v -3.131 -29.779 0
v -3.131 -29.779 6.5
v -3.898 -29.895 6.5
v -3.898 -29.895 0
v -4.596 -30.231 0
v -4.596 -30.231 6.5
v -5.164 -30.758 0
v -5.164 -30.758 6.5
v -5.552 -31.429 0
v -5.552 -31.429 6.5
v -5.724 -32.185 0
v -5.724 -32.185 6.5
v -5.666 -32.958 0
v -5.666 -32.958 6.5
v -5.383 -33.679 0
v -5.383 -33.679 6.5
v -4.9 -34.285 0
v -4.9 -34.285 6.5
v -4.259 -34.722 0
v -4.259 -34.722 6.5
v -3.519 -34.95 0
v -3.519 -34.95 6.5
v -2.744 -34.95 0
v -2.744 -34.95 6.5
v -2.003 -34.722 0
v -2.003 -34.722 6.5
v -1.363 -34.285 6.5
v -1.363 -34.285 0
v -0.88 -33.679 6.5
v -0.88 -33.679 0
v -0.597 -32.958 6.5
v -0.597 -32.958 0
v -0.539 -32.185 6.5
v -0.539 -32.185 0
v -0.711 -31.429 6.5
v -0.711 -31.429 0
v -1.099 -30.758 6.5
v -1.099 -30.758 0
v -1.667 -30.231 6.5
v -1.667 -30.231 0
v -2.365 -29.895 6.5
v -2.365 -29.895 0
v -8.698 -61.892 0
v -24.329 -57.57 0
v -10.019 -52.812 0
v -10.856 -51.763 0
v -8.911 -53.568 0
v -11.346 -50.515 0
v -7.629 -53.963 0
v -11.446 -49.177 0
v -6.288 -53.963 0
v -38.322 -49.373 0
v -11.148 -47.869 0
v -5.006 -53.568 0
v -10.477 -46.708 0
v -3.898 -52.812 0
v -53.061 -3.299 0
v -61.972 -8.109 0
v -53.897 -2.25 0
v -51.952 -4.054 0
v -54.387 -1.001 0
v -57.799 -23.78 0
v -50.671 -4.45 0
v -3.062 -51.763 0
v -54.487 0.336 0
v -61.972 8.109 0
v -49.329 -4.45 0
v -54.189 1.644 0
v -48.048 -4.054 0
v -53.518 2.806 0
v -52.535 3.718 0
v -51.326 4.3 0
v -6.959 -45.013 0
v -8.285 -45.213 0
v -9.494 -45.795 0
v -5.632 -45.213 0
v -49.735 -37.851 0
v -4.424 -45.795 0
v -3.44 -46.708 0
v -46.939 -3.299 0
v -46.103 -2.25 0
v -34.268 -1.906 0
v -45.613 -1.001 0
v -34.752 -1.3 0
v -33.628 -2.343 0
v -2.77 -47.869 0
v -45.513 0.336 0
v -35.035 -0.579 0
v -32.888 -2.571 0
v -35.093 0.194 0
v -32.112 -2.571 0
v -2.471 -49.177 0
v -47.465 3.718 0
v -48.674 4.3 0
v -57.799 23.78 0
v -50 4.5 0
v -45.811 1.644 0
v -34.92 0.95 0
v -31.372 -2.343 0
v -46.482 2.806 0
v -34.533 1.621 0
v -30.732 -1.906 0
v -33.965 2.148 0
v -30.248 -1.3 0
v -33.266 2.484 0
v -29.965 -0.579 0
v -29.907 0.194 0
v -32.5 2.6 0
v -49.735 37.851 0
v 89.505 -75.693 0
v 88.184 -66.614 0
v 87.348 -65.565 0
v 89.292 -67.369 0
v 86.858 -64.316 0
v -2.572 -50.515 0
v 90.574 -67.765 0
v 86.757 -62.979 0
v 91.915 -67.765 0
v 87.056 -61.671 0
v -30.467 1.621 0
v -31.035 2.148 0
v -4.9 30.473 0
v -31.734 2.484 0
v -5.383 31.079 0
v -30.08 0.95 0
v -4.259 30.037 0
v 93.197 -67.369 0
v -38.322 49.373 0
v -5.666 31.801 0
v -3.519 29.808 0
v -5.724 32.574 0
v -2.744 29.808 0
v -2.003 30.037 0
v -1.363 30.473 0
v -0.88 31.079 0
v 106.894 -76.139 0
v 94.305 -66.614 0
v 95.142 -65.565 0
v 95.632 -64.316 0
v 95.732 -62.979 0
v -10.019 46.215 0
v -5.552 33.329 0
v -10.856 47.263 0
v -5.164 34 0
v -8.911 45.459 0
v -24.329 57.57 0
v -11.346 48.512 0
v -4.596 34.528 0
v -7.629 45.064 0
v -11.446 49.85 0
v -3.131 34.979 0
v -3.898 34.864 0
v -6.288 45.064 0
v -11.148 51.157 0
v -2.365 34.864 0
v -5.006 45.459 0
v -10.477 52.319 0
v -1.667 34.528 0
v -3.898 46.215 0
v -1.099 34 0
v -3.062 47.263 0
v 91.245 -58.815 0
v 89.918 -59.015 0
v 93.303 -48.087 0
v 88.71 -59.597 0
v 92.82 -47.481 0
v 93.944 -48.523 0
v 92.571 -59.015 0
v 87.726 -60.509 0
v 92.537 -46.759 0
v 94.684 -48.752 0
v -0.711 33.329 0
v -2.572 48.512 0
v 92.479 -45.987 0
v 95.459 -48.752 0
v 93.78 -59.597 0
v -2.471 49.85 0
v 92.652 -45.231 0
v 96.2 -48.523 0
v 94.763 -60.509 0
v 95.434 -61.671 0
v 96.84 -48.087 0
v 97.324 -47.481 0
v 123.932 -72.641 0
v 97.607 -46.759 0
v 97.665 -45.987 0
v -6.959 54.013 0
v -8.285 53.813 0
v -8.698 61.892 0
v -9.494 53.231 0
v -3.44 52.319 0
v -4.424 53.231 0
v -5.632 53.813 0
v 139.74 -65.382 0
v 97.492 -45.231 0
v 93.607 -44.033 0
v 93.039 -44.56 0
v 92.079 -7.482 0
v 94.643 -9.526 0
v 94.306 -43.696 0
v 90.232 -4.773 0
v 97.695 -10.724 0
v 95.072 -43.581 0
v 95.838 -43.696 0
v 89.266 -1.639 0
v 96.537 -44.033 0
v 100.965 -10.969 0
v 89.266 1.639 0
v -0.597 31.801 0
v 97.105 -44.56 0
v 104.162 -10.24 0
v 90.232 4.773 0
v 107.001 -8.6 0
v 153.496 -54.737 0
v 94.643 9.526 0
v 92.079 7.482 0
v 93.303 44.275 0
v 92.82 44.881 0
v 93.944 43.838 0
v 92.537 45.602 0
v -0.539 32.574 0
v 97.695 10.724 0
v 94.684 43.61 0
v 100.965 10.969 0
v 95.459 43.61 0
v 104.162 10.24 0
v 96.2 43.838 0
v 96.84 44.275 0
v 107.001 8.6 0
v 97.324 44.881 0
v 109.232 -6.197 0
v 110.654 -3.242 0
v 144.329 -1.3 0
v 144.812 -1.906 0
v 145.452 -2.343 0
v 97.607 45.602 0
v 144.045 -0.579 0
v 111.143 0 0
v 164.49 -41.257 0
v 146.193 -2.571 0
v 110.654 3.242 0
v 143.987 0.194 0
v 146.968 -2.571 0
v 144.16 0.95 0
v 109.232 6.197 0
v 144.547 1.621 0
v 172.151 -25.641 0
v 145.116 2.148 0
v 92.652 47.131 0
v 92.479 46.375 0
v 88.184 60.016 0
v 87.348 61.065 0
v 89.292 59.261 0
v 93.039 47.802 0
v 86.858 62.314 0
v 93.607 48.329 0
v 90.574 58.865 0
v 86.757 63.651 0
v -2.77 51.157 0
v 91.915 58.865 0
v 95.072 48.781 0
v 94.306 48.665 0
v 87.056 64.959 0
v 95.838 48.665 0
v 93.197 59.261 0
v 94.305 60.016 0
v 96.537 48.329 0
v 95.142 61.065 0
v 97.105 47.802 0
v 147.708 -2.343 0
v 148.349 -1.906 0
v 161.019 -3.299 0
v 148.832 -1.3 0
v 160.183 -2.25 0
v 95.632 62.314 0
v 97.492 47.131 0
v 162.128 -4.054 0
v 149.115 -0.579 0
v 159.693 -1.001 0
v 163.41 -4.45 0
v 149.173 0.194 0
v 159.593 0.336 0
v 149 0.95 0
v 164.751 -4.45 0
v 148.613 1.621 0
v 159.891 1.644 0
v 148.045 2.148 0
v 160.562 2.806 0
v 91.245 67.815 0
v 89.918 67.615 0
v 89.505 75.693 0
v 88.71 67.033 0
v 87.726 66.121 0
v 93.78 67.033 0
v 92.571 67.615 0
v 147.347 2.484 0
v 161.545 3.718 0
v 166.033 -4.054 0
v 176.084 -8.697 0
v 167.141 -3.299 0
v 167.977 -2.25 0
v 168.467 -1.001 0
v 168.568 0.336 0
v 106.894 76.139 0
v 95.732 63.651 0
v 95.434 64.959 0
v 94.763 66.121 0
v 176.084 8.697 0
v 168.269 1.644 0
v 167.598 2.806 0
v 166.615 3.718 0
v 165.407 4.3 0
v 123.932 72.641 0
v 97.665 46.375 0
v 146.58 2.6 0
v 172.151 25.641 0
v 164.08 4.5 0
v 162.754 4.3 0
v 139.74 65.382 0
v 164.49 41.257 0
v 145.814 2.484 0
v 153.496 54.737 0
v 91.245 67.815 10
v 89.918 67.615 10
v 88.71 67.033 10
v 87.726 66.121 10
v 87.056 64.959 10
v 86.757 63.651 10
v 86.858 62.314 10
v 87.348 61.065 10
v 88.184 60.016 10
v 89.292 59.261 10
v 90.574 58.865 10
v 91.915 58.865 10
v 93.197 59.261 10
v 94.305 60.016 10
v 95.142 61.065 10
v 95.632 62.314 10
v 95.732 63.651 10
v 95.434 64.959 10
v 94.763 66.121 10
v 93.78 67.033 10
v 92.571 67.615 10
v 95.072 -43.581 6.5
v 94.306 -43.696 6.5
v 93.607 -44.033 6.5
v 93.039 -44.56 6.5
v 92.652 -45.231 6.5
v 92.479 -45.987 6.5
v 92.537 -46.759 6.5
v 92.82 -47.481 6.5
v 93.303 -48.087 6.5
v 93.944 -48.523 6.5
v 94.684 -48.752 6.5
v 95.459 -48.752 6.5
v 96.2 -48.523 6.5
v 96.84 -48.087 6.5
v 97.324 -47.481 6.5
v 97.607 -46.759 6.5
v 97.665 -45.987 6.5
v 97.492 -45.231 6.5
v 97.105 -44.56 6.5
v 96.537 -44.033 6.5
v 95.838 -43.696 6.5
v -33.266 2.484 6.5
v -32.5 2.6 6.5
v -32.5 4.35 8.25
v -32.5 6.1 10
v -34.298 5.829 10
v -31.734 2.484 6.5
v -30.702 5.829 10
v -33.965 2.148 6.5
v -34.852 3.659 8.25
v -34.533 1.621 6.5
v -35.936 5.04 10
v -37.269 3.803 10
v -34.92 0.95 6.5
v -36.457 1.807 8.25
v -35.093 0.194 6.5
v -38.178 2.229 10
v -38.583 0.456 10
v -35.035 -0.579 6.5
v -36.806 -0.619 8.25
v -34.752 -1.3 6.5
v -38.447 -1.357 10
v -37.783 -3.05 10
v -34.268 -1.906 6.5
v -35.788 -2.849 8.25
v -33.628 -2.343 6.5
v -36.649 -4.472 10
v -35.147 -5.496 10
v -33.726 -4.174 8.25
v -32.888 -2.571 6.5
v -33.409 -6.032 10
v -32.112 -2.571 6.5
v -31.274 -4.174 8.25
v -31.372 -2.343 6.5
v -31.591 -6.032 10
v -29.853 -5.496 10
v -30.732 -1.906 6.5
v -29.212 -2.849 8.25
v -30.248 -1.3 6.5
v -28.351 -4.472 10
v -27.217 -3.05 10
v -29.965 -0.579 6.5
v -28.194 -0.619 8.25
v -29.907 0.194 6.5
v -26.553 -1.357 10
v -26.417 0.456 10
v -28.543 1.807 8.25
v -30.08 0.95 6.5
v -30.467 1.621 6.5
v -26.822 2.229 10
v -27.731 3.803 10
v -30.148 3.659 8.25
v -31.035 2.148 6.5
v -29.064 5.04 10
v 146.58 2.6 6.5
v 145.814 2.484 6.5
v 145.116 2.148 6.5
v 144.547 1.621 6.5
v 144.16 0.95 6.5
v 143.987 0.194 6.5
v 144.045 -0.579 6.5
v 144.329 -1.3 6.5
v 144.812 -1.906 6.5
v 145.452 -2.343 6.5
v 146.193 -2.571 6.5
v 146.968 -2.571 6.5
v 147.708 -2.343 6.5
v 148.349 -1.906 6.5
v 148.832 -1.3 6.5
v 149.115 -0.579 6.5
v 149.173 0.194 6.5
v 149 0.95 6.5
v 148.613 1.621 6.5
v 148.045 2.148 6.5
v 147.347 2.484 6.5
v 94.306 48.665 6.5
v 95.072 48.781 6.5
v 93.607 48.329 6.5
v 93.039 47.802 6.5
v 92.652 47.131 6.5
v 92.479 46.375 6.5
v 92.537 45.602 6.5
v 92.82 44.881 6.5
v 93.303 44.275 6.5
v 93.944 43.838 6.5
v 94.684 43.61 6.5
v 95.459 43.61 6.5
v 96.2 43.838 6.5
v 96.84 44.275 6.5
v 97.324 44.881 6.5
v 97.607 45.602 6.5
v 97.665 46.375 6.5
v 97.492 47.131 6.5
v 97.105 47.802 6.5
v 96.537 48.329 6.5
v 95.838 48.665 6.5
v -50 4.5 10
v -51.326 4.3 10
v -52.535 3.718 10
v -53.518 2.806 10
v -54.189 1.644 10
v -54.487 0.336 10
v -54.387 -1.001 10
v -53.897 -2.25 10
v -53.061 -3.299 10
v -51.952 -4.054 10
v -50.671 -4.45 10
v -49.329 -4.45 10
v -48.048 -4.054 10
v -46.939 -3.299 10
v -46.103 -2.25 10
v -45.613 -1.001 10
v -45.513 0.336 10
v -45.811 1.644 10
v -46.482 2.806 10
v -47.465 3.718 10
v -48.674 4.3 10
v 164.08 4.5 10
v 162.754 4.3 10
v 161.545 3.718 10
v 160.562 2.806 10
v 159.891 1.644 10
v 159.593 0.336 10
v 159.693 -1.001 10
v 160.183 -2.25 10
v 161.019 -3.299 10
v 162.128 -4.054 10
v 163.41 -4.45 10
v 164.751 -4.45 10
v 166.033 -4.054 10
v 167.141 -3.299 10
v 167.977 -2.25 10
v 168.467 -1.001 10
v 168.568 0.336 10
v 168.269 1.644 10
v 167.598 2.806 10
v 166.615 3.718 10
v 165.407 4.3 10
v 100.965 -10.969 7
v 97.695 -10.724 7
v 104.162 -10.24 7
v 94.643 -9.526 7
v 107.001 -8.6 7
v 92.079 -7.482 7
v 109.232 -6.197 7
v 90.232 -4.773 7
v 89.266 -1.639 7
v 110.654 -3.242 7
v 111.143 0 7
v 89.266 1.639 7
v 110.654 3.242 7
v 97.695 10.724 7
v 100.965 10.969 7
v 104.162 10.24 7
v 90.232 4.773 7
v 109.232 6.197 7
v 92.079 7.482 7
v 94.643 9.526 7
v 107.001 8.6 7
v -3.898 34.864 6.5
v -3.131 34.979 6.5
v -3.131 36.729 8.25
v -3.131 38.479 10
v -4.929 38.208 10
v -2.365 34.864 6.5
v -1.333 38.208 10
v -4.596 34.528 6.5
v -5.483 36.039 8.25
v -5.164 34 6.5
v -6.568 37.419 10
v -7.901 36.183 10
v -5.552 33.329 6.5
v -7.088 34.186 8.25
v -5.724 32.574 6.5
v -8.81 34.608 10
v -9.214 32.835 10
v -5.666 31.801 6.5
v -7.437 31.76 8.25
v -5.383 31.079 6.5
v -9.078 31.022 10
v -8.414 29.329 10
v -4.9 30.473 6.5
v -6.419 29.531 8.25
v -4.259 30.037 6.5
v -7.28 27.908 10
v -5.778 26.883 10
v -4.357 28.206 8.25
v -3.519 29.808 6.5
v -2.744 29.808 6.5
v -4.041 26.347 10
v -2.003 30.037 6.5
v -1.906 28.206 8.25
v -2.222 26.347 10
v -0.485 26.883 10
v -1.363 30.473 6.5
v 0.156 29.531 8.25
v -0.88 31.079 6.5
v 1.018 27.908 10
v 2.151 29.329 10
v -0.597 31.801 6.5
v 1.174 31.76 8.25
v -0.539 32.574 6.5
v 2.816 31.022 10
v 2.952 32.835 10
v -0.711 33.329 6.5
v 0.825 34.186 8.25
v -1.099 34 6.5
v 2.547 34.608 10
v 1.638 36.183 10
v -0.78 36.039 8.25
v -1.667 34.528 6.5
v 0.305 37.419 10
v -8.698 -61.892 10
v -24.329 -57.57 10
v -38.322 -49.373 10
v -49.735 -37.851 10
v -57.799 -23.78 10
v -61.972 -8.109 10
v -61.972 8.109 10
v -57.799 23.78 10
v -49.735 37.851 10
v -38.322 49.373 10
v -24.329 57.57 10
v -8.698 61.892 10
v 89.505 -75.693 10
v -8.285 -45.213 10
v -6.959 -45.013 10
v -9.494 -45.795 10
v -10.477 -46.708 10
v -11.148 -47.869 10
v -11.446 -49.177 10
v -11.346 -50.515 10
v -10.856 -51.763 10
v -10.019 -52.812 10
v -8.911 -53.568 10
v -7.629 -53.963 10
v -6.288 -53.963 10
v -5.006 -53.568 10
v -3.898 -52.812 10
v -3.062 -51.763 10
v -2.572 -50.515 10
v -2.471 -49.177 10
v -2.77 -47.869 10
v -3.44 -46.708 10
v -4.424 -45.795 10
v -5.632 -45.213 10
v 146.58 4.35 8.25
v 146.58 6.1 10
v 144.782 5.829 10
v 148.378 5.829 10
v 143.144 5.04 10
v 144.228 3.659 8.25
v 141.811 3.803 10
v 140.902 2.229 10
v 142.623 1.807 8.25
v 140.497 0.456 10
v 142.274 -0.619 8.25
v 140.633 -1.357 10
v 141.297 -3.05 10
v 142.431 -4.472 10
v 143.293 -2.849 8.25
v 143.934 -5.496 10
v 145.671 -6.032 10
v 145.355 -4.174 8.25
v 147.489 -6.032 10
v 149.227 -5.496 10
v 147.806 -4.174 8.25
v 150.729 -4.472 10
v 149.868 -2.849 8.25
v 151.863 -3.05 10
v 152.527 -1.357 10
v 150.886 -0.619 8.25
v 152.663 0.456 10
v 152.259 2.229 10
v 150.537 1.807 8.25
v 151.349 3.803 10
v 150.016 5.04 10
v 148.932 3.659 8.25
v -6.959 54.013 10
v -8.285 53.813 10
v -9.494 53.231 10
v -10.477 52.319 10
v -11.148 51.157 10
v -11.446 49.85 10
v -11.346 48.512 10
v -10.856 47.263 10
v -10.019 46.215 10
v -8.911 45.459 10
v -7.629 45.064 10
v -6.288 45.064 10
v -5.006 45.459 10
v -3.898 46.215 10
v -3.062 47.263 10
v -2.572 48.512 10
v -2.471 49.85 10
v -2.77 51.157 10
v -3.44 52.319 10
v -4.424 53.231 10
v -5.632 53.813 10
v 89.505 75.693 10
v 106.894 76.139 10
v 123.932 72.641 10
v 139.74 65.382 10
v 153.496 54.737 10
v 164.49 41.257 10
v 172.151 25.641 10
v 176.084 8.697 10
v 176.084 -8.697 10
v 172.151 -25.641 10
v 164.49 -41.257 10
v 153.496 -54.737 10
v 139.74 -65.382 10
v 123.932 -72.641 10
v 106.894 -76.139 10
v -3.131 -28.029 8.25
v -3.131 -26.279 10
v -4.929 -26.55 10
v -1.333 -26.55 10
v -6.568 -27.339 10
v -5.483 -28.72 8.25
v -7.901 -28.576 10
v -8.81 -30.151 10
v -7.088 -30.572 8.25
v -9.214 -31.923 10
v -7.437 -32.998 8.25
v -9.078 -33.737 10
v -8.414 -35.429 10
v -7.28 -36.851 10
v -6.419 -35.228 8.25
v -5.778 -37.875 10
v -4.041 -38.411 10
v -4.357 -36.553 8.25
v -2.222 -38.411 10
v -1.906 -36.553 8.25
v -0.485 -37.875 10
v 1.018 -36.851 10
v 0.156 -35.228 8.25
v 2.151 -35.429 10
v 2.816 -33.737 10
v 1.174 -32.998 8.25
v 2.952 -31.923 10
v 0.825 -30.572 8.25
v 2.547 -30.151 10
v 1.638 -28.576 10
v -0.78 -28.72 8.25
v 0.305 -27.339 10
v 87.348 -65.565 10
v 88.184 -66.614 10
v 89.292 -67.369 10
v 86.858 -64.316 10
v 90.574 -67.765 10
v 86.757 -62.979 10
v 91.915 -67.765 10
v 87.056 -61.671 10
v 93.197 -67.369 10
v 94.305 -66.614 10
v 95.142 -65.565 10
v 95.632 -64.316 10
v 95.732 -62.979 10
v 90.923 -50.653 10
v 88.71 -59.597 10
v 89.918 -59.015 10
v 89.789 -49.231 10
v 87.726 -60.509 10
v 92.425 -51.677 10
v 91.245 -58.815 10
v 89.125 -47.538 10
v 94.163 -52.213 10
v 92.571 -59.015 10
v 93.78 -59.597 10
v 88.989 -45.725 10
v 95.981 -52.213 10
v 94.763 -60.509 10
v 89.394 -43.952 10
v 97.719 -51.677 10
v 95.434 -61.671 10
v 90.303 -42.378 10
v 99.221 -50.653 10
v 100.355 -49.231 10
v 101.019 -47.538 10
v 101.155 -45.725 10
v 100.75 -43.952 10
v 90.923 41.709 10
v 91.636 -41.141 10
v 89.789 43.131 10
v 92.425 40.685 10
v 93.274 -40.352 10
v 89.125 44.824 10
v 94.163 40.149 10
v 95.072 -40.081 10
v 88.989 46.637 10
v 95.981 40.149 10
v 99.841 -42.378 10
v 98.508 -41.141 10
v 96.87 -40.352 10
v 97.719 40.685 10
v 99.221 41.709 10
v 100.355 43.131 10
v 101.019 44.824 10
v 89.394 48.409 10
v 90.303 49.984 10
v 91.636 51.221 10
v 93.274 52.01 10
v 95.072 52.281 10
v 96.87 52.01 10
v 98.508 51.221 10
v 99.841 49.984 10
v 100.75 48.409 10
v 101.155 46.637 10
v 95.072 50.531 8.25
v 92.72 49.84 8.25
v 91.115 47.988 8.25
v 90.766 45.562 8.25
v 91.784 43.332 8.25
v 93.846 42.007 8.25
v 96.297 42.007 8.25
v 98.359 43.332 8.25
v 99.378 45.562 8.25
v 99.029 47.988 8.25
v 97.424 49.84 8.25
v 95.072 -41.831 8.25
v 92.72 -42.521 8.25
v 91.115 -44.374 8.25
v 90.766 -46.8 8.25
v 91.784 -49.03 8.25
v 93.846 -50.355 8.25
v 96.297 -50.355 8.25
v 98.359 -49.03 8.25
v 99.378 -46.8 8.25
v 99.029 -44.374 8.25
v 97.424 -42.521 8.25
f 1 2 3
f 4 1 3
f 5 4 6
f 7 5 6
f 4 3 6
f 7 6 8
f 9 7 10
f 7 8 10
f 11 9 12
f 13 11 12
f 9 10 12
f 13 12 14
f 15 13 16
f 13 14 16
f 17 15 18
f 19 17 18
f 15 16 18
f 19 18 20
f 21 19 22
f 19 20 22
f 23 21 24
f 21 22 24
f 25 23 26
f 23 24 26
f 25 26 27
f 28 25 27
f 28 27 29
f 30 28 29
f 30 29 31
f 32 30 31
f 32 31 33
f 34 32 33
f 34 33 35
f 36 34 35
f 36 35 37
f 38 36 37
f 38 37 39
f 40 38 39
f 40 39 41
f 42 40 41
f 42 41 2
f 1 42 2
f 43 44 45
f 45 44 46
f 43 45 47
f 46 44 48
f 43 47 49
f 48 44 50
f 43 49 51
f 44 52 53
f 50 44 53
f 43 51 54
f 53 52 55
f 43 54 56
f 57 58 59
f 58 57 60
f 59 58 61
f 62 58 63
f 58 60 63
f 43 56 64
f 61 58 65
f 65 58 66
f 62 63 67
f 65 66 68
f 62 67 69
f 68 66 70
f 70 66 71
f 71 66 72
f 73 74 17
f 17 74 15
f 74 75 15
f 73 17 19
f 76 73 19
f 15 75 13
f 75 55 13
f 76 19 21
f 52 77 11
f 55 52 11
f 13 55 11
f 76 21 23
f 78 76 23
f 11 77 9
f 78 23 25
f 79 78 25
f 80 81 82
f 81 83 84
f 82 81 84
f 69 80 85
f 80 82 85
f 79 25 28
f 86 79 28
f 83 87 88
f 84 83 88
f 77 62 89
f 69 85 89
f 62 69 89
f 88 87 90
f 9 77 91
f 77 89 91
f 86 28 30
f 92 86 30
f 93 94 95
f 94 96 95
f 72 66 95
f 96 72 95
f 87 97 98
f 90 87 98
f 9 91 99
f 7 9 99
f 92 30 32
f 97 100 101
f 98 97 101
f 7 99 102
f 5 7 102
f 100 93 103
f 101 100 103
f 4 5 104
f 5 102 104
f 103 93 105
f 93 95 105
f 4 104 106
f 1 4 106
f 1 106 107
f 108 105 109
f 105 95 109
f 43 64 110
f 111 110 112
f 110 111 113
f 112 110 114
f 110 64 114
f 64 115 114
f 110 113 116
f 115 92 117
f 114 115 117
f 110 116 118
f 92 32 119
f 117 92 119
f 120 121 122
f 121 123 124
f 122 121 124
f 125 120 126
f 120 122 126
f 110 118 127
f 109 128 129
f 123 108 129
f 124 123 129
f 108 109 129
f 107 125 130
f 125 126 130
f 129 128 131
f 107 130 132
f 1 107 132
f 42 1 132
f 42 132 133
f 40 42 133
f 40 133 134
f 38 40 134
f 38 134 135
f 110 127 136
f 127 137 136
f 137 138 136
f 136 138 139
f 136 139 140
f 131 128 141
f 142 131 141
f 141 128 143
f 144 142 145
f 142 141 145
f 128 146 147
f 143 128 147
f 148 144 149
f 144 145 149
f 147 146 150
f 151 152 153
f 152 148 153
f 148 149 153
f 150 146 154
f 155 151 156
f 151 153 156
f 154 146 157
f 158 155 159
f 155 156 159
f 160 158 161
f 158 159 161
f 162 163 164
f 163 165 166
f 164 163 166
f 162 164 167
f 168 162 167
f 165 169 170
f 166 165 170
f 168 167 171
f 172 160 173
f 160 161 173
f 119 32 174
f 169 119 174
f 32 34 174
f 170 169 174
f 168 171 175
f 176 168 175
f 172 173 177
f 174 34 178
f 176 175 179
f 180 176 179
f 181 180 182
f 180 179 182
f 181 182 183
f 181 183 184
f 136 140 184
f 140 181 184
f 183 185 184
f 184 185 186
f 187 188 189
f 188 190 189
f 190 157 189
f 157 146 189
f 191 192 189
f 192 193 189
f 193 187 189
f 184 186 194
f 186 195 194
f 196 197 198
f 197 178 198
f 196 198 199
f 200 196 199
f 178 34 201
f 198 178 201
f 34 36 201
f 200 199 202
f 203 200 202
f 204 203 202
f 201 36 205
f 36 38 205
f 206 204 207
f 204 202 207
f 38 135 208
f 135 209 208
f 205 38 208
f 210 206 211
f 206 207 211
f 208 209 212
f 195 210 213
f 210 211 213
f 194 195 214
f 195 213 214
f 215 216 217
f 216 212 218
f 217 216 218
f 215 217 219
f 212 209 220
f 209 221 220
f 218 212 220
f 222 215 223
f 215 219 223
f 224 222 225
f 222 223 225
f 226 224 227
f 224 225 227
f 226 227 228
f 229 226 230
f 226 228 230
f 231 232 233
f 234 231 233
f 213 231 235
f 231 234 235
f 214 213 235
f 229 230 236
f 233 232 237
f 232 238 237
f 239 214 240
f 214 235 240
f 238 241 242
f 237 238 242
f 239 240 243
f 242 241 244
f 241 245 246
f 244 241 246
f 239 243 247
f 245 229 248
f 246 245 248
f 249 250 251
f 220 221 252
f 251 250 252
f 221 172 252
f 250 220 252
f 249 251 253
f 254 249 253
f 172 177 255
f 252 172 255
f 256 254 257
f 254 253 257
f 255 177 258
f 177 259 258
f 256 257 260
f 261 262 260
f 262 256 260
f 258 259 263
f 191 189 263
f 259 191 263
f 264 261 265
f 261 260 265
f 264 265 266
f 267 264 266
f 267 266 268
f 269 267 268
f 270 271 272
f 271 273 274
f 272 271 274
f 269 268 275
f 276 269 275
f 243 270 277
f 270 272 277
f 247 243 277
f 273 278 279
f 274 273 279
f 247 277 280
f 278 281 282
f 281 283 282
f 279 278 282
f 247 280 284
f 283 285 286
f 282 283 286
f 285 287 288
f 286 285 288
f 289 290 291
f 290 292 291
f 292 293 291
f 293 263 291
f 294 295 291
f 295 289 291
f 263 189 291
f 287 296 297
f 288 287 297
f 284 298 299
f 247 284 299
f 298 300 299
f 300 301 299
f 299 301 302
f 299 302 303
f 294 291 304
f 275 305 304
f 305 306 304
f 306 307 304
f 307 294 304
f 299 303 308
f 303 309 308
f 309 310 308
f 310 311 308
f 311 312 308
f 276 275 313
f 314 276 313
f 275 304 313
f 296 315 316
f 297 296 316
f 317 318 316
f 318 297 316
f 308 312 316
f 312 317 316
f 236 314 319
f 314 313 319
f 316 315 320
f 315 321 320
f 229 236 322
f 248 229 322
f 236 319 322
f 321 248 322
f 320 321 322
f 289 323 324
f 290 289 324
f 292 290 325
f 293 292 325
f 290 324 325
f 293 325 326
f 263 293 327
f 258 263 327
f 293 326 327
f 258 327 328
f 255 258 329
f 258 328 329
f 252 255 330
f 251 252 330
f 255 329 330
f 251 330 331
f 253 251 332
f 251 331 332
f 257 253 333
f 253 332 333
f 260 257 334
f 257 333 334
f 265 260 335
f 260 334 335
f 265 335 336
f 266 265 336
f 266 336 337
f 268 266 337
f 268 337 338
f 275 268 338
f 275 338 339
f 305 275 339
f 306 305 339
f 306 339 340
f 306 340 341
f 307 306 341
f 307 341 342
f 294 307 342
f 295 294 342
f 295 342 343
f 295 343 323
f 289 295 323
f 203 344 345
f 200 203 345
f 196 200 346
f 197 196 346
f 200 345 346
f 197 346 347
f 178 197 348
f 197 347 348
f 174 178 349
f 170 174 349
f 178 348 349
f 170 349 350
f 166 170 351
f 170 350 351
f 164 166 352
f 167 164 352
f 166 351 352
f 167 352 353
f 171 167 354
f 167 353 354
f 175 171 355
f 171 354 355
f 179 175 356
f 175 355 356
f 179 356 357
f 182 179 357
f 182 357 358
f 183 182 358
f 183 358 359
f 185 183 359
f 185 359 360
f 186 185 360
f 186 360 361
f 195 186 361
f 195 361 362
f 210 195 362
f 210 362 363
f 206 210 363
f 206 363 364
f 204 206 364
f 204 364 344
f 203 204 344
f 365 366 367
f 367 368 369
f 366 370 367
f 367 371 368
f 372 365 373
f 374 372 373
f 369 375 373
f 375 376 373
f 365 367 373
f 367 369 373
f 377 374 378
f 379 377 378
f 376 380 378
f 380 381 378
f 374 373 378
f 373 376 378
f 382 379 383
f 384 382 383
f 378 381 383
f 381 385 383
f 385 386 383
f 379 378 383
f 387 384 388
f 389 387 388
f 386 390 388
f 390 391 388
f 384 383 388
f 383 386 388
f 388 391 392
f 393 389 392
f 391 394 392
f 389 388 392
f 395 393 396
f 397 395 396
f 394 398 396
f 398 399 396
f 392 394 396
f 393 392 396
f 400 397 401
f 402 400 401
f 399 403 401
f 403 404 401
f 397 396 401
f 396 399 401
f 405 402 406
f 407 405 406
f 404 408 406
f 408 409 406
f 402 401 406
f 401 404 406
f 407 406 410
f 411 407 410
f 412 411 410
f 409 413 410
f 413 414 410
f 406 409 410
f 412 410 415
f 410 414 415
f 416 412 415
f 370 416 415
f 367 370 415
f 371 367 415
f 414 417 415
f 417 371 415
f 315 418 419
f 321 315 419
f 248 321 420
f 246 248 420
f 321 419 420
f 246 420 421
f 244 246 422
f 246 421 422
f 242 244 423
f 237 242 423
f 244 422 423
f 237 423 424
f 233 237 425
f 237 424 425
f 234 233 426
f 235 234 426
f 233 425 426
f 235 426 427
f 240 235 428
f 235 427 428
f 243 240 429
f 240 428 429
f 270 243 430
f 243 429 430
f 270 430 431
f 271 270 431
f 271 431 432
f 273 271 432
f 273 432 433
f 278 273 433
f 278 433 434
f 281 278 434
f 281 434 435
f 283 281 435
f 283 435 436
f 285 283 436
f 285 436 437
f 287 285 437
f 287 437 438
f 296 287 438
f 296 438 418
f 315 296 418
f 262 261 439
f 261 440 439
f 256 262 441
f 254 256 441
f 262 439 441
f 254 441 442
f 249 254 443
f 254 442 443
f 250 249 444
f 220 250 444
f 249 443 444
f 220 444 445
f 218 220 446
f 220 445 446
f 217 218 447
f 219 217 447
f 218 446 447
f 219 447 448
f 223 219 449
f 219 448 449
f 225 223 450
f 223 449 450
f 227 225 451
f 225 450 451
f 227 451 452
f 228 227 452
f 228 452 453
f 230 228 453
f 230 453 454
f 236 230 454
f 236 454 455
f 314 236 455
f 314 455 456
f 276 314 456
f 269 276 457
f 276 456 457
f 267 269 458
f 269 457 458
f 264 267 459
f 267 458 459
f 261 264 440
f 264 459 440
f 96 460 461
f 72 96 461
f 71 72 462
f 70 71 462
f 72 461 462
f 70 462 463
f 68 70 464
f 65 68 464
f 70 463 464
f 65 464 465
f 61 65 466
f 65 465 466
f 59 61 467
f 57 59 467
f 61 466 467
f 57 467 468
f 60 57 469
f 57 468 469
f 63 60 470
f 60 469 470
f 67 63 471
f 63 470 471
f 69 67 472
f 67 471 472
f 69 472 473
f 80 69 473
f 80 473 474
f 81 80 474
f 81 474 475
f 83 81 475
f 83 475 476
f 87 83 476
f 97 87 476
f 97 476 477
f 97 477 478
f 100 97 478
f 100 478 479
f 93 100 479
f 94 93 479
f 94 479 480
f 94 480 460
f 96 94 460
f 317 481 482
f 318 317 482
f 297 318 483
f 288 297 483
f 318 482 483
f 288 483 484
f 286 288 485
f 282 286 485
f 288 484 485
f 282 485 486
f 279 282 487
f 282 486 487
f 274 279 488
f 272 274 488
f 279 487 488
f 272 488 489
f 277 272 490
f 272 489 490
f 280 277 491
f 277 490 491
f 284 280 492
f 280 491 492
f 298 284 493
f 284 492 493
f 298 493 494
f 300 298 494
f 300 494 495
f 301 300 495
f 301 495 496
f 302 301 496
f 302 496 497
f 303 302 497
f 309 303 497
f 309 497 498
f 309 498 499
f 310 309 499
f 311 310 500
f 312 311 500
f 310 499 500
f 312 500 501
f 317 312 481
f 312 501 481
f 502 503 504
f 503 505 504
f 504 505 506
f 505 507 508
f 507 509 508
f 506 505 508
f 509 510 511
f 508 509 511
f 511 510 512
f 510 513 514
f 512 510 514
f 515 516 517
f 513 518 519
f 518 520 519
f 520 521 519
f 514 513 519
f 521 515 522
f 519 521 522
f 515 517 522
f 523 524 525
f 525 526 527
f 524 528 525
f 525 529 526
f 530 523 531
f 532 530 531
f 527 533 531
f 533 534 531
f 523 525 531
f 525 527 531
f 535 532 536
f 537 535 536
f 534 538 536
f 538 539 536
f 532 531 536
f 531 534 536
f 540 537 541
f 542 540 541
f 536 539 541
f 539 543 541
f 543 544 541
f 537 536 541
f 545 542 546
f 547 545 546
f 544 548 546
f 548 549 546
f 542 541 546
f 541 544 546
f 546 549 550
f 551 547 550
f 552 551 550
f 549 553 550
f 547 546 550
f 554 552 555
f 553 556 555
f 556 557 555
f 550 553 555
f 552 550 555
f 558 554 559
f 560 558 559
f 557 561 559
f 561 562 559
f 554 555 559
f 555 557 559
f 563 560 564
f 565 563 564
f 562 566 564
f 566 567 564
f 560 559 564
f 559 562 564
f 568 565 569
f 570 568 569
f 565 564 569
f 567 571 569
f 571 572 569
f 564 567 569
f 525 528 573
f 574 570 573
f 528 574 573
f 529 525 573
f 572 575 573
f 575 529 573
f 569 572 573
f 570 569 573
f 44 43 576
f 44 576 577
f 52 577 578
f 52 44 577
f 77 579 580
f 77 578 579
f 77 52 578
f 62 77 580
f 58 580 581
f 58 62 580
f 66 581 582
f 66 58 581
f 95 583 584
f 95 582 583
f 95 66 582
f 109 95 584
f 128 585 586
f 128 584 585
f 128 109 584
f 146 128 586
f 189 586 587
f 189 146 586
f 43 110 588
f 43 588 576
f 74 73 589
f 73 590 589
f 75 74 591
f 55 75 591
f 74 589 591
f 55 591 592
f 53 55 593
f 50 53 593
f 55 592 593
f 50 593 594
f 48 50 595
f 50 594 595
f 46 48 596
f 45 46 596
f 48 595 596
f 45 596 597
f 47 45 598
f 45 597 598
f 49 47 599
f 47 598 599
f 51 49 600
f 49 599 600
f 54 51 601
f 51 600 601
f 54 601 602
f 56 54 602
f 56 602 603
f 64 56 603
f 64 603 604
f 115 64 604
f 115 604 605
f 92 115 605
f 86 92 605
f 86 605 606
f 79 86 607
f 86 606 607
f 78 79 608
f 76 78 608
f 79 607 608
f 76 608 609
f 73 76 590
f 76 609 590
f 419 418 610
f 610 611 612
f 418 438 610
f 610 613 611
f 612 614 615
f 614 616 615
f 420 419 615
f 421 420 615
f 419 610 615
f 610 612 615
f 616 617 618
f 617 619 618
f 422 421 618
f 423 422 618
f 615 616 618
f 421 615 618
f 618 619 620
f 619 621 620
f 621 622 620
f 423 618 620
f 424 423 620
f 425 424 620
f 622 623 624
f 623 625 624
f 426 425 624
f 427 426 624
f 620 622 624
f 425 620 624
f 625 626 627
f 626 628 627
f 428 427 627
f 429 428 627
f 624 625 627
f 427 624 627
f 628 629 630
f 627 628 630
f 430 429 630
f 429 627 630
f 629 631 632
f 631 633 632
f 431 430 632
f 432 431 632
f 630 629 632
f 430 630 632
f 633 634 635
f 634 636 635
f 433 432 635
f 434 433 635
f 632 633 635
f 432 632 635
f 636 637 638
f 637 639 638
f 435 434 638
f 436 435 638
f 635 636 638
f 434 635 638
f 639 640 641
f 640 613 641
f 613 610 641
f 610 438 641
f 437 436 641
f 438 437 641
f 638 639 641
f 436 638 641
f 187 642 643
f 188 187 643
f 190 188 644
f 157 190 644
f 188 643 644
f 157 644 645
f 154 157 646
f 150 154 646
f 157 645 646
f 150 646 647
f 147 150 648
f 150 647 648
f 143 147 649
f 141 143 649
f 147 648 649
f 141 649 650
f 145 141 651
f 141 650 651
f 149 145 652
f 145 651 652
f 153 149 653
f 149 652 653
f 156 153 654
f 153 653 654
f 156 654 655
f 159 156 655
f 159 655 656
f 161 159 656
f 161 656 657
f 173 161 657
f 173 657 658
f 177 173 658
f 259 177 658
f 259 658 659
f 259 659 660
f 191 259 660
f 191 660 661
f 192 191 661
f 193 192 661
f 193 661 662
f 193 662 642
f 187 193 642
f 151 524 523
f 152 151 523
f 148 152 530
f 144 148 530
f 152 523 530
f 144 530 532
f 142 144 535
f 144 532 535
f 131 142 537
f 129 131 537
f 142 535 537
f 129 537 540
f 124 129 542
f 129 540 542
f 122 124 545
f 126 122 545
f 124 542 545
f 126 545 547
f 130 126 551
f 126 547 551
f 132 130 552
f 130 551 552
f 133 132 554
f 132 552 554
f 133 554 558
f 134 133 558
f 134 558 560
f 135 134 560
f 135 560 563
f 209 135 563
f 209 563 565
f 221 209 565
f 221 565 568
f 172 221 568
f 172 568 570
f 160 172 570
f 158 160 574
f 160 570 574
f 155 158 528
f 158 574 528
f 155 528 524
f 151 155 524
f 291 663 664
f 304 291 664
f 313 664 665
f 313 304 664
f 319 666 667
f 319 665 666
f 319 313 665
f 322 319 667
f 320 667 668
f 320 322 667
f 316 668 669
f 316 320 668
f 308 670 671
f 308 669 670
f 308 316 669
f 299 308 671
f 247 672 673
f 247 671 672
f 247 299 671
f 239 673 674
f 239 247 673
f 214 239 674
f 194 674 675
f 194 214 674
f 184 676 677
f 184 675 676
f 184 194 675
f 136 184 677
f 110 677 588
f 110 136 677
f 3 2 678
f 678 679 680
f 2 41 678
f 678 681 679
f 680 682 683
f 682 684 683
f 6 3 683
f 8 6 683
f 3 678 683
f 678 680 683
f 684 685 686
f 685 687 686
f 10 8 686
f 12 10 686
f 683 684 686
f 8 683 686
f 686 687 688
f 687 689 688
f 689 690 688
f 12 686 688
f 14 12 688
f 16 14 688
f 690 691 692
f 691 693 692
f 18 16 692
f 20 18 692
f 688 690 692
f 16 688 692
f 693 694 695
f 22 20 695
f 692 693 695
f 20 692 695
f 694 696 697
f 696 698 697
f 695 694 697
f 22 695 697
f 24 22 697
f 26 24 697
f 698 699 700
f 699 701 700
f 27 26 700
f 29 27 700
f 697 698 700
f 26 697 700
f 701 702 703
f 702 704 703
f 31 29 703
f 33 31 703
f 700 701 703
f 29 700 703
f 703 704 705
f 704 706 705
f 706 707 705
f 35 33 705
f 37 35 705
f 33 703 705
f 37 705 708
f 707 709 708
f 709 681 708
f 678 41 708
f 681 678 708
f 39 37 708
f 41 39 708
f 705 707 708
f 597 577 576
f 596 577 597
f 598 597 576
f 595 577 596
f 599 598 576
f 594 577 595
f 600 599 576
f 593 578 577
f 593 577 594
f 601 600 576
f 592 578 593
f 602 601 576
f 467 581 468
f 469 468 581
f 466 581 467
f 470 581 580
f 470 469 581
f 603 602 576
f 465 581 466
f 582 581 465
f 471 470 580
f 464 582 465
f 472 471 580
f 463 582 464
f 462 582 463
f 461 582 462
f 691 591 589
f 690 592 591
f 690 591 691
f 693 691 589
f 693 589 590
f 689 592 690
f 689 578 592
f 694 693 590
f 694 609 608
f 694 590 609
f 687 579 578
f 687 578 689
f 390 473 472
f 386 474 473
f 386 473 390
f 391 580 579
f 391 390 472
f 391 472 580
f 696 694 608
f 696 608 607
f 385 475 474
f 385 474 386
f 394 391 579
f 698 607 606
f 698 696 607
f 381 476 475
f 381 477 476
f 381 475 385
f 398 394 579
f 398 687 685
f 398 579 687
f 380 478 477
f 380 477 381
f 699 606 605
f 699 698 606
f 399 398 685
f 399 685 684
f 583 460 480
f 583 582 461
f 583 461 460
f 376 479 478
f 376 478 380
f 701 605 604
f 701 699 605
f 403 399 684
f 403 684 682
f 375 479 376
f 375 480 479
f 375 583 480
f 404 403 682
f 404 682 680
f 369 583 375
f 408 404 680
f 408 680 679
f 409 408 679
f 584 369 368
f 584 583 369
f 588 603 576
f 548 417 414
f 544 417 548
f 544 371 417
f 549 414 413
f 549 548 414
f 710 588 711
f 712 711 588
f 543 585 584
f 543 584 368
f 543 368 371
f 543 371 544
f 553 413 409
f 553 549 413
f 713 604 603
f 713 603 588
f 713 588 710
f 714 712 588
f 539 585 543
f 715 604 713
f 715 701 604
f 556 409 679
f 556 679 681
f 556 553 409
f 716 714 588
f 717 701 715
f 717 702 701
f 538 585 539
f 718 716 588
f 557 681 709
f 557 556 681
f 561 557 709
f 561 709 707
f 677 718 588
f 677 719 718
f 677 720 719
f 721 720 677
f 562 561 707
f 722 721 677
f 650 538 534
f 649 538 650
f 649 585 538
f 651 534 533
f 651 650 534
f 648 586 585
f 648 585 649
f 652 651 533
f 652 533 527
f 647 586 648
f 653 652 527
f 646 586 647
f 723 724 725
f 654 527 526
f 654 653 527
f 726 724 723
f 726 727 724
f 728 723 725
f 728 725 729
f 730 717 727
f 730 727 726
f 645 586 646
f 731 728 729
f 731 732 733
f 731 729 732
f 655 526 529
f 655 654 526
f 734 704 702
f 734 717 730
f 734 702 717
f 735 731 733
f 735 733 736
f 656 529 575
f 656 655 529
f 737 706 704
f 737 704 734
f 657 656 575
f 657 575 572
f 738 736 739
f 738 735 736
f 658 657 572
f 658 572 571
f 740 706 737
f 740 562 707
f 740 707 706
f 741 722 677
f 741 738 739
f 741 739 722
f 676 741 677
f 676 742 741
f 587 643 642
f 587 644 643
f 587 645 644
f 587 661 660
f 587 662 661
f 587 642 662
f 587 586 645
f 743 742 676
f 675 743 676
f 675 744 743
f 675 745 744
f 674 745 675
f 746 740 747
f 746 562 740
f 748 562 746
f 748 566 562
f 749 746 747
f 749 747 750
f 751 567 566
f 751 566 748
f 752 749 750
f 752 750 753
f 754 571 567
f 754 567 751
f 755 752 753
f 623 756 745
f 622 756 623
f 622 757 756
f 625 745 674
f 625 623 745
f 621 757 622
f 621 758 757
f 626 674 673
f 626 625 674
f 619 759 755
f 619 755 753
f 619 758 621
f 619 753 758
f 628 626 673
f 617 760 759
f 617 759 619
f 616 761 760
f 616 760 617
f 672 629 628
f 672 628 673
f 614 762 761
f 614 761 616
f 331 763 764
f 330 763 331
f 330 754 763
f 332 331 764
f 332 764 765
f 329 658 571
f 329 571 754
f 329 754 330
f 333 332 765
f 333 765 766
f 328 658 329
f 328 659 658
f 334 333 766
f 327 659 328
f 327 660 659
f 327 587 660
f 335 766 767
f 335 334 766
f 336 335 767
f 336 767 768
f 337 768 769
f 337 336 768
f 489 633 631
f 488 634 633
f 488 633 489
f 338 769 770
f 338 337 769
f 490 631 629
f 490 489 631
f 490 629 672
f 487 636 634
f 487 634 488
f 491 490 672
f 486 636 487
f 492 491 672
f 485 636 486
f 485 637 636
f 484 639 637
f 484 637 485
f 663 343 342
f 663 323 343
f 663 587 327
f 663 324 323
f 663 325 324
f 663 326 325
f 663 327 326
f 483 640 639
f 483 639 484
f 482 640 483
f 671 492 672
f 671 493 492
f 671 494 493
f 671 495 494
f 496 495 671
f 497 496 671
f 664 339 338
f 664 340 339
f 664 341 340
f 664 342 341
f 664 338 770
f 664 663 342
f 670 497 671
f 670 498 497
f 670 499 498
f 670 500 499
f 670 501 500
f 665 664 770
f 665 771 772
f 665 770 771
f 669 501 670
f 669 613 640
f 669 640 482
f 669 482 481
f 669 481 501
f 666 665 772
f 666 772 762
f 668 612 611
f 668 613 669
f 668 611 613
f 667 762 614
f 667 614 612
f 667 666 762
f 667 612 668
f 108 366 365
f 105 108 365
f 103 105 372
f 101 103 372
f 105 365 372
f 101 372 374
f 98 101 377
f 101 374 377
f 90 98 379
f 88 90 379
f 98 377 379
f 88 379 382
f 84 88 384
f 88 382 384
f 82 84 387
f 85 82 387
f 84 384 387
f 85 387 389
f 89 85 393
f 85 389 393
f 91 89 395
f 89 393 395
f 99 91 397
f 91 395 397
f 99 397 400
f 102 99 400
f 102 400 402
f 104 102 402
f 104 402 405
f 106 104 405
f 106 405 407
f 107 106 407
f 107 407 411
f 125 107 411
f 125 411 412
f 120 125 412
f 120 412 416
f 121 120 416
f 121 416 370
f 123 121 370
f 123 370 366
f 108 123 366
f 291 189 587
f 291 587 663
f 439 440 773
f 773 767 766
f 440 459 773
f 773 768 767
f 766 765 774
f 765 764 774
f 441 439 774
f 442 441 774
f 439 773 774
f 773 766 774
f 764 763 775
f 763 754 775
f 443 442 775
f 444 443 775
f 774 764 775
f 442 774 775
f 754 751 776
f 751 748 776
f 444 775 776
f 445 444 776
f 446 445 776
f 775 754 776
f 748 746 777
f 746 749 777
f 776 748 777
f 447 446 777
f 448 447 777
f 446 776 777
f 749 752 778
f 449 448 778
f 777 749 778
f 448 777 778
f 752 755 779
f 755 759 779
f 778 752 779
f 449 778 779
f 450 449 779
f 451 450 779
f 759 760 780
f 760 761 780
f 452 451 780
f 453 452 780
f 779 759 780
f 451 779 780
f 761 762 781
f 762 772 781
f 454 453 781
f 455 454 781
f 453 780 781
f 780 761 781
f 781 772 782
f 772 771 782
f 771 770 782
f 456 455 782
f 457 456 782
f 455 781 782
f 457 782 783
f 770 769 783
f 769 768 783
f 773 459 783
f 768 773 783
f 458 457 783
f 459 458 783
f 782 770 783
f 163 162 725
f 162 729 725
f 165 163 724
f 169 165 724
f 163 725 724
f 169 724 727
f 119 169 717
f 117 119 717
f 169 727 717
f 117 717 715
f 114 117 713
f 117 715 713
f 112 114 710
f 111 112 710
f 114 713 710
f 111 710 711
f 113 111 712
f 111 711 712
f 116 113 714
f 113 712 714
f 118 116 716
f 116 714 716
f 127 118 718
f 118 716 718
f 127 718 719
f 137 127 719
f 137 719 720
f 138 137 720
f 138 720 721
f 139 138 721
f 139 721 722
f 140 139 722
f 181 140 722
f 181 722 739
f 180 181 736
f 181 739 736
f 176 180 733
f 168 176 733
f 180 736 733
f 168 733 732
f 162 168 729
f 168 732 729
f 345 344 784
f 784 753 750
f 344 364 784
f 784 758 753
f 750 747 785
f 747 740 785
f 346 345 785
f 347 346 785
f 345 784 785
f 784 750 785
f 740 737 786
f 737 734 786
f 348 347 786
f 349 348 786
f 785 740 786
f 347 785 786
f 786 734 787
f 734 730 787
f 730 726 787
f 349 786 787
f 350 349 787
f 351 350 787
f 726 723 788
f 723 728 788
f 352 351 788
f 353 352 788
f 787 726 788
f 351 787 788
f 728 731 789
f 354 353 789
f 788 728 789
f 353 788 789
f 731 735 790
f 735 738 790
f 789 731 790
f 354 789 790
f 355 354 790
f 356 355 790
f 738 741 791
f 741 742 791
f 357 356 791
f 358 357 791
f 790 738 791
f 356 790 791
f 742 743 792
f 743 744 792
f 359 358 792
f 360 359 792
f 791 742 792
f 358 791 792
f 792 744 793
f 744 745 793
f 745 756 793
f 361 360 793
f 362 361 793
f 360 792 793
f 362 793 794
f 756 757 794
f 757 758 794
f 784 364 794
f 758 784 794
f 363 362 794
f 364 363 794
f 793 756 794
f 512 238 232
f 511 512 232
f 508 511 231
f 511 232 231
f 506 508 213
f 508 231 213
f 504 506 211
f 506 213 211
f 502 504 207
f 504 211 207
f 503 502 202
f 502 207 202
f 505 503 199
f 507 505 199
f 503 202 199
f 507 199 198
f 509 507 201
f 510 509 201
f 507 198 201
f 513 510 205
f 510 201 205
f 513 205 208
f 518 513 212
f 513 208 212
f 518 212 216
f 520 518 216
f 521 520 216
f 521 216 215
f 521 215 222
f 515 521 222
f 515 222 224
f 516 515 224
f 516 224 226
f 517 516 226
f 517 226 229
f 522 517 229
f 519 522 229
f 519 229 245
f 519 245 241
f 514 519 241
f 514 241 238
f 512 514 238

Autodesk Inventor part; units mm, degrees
ref_plane "YZ Plane" through (0, 0, 0) normal (1, 0, 0) x (0, 1, 0)
ref_plane "XZ Plane" through (0, 0, 0) normal (0, 1, 0) x (-1, 0, 0)
ref_plane "XY Plane" through (0, 0, 0) normal (0, 0, 1) x (1, 0, 0)
sketch "Sketch1" plane through (0, 0, 0) normal (0, 0, 1) x (1, 0, 0)
  arc A0 (-5.9149, 42.0864) -> (-5.9149, -42.0864) centre (0, 0) ccw
  arc A1 (92.2885, -55.888) -> (92.2885, 55.888) centre (100.143, 0) ccw
  line L0 (-42.5, 0) -> (156.5802, 0)
  line L1 (92.2885, 55.888) -> (-5.9149, 42.0864)
  line L2 (-5.9149, -42.0864) -> (92.2885, -55.888)
  line L3 (-3.1314, 22.281) -> (95.0719, 36.0826)
  arc A2 (95.0719, -36.0826) -> (95.0719, 36.0826) centre (100.143, 0) ccw
  line L4 (95.0719, -36.0826) -> (-3.1314, -22.281)
  arc A3 (-3.1314, 22.281) -> (-3.1314, -22.281) centre (0, 0) ccw
  circle A4 centre (100.143, 0) radius 11
  line L5 (89.505, -75.6933) -> (-8.6983, -61.8918)
  arc A5 (-8.6983, 61.8918) -> (-8.6983, -61.8918) centre (0, 0) ccw
  line L6 (-8.6983, 61.8918) -> (89.505, 75.6933)
  arc A6 (89.505, -75.6933) -> (89.505, 75.6933) centre (100.143, 0) ccw
  point P0 (146.5802, 0)
  point P1 (95.0719, 46.1809)
  point P2 (95.0719, -46.1809)
  point P3 (-32.5, 0)
  point P4 (-3.1314, 32.3793)
  point P5 (-3.1314, -32.3793)
  dimension "d0" = 85
  dimension "d1" = 100.143
  dimension "d2" = 8
  dimension "d3" = 20
  dimension "d4" = 10
  dimension "d5" = 10
  dimension "d6" = 10
  dimension "d7" = 10
  dimension "d8" = 10
  dimension "d9" = 10
  dimension "d22" = 22
  dimension "d26" = 20
extrude "Extrusion1" add sketch "Sketch1" along normal blind 10 contours L1 A1 L0 A2 L3 A3 A0 | L0 A3 L4 A2 A1 L2 A0 | A3 L3 A2 L0 A4 | L0 A4 A2 L4 A3 | L5 A5 L6 A6
sketch "Sketch4" plane through (0, 0, 10) normal (0, 0, 1) x (1, 0, 0)
  circle A0 centre (100.143, 0) radius 11.5 projected
  point P0 (0, 0)
extrude "Extrusion4" add sketch "Sketch4" against normal blind 3
hole "Hole3" at (146.5802, 0, 0) at (95.0719, 46.1809, 0) at (95.0719, -46.1809, 0) at (-32.5, 0, 0) at (-3.1314, 32.3793, 0) at (-3.1314, -32.3793, 0) direction (0, 0, 1) diameter 5.2 end through all
sketch "Sketch8" plane through (0, 0, 0) normal (0, 0, -1) x (-1, 0, 0)
  circle A0 centre (6.9587, -49.5134) radius 4.5
  circle A1 centre (-164.0802, 0) radius 4.5
  circle A2 centre (6.9587, 49.5134) radius 4.5
  circle A3 centre (-91.2447, 63.315) radius 4.5
  circle A4 centre (-91.2447, -63.315) radius 4.5
  circle A5 centre (50, 0) radius 4.5
  line L0 (8.6983, -61.8918) -> (-89.505, -75.6933)
  arc A6 (8.6983, -61.8918) -> (8.6983, 61.8918) centre (0, 0) ccw
  line L1 (-89.505, 75.6933) -> (8.6983, 61.8918)
  arc A7 (-89.505, 75.6933) -> (-89.505, -75.6933) centre (-100.143, 0) ccw
  circle A8 centre (32.5, 0) radius 2.067
  circle A9 centre (3.1314, 32.3793) radius 2.067
  circle A10 centre (-95.0719, 46.1809) radius 2.067
  circle A11 centre (-146.5802, 0) radius 2.067
  arc A12 (-94.3761, 41.0339) -> (-94.3761, -41.0339) centre (-100.143, 0) ccw
  line L2 (3.8273, 27.2324) -> (-94.3761, 41.0339)
  arc A13 (3.8273, -27.2324) -> (3.8273, 27.2324) centre (0, 0) ccw
  line L3 (-94.3761, -41.0339) -> (3.8273, -27.2324)
  circle A14 centre (-95.0719, -46.1809) radius 2.067
  circle A15 centre (3.1314, -32.3793) radius 2.067
  circle A16 centre (3.1314, 32.3793) radius 2.6 projected
  circle A17 centre (-95.0719, -46.1809) radius 2.6 projected
  circle A18 centre (-146.5802, 0) radius 2.6 projected
  circle A19 centre (-95.0719, 46.1809) radius 2.6 projected
  circle A20 centre (32.5, 0) radius 2.6 projected
  circle A21 centre (3.1314, -32.3793) radius 2.6 projected
  line L4 (-89.505, 75.6933) -> (8.6983, 61.8918) projected
  arc A22 (-89.505, 75.6933) -> (-89.505, -75.6933) centre (-100.143, 0) ccw projected
  line L5 (8.6983, -61.8918) -> (-89.505, -75.6933) projected
  arc A23 (8.6983, -61.8918) -> (8.6983, 61.8918) centre (0, 0) ccw projected
hole "Hole6" at (164.0802, 0, 0) at (91.2447, -63.315, 0) at (-6.9587, -49.5134, 0) at (-50, 0, 0) at (-6.9587, 49.5134, 0) at (91.2447, 63.315, 0) direction (0, 0, 1) diameter 9 depth 40 tip angle 118 clearance for "Hex Head Cap Screw ISO 24017" size "M8" standard "ISO"
chamfer "Chamfer6" distance 3.5 angle 45 6 edges at (95.0719, 43.5809, 10) (146.5802, -2.6, 10) (95.0719, -48.7809, 10) (-3.1314, -34.9793, 10) (-32.5, -2.6, 10) (-3.1314, 29.7793, 10)
equation "\"d4\" = d7"
equation "\"d5\" = d8"
equation "\"d6\" = d7"
equation "\"d8\" = d7"
equation "\"d9\" = d4"
properties part number "onderkantBasegefreesd" material "Aluminum 6061"
